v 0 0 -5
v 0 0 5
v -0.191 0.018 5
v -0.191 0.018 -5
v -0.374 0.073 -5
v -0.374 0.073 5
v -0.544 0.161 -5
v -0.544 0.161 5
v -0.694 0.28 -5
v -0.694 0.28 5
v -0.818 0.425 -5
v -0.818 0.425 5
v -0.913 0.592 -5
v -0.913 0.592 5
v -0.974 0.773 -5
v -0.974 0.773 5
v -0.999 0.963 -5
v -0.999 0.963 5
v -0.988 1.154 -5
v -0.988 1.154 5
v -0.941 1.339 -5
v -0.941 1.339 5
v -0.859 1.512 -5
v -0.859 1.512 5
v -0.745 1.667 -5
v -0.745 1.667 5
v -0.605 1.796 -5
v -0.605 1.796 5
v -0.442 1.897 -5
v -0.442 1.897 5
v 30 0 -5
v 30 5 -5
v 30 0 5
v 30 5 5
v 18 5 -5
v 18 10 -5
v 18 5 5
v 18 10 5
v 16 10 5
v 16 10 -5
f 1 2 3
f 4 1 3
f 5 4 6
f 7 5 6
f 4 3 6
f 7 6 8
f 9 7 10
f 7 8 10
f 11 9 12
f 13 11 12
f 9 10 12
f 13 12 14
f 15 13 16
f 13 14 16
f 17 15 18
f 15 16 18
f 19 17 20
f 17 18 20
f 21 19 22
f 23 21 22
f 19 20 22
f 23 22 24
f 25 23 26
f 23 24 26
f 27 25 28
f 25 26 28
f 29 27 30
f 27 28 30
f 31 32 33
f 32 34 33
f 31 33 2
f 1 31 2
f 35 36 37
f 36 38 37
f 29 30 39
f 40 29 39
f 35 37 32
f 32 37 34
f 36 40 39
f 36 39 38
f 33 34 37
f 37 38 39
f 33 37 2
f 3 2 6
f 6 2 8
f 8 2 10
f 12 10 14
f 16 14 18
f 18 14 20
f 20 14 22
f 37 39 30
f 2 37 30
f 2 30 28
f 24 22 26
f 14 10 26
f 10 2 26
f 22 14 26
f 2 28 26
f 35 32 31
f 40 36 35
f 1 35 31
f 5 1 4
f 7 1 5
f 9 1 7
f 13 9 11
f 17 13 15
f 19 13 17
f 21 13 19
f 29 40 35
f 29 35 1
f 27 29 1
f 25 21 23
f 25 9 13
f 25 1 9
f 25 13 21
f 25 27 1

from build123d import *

# Parameters (mm, degrees)
BASE_EXTRUDE_DEPTH = 5


with BuildPart() as part:
    # Sketch1 → Base-Extrude (new body, symmetric)
    with BuildSketch(Plane.XY):
        with BuildLine():
            Line((-0.442055564, 1.896987669), (16, 10))
            Line((16, 10), (18, 10))
            Line((18, 10), (18, 5))
            Line((18, 5), (30, 5))
            Line((30, 5), (30, 0))
            Line((30, 0), (0, 0))
            ThreePointArc((0, 0), (-0.973906481, 0.773050302), (-0.442055564, 1.896987669))
        make_face()
    extrude(amount=BASE_EXTRUDE_DEPTH, both=True)


solid = part.part
